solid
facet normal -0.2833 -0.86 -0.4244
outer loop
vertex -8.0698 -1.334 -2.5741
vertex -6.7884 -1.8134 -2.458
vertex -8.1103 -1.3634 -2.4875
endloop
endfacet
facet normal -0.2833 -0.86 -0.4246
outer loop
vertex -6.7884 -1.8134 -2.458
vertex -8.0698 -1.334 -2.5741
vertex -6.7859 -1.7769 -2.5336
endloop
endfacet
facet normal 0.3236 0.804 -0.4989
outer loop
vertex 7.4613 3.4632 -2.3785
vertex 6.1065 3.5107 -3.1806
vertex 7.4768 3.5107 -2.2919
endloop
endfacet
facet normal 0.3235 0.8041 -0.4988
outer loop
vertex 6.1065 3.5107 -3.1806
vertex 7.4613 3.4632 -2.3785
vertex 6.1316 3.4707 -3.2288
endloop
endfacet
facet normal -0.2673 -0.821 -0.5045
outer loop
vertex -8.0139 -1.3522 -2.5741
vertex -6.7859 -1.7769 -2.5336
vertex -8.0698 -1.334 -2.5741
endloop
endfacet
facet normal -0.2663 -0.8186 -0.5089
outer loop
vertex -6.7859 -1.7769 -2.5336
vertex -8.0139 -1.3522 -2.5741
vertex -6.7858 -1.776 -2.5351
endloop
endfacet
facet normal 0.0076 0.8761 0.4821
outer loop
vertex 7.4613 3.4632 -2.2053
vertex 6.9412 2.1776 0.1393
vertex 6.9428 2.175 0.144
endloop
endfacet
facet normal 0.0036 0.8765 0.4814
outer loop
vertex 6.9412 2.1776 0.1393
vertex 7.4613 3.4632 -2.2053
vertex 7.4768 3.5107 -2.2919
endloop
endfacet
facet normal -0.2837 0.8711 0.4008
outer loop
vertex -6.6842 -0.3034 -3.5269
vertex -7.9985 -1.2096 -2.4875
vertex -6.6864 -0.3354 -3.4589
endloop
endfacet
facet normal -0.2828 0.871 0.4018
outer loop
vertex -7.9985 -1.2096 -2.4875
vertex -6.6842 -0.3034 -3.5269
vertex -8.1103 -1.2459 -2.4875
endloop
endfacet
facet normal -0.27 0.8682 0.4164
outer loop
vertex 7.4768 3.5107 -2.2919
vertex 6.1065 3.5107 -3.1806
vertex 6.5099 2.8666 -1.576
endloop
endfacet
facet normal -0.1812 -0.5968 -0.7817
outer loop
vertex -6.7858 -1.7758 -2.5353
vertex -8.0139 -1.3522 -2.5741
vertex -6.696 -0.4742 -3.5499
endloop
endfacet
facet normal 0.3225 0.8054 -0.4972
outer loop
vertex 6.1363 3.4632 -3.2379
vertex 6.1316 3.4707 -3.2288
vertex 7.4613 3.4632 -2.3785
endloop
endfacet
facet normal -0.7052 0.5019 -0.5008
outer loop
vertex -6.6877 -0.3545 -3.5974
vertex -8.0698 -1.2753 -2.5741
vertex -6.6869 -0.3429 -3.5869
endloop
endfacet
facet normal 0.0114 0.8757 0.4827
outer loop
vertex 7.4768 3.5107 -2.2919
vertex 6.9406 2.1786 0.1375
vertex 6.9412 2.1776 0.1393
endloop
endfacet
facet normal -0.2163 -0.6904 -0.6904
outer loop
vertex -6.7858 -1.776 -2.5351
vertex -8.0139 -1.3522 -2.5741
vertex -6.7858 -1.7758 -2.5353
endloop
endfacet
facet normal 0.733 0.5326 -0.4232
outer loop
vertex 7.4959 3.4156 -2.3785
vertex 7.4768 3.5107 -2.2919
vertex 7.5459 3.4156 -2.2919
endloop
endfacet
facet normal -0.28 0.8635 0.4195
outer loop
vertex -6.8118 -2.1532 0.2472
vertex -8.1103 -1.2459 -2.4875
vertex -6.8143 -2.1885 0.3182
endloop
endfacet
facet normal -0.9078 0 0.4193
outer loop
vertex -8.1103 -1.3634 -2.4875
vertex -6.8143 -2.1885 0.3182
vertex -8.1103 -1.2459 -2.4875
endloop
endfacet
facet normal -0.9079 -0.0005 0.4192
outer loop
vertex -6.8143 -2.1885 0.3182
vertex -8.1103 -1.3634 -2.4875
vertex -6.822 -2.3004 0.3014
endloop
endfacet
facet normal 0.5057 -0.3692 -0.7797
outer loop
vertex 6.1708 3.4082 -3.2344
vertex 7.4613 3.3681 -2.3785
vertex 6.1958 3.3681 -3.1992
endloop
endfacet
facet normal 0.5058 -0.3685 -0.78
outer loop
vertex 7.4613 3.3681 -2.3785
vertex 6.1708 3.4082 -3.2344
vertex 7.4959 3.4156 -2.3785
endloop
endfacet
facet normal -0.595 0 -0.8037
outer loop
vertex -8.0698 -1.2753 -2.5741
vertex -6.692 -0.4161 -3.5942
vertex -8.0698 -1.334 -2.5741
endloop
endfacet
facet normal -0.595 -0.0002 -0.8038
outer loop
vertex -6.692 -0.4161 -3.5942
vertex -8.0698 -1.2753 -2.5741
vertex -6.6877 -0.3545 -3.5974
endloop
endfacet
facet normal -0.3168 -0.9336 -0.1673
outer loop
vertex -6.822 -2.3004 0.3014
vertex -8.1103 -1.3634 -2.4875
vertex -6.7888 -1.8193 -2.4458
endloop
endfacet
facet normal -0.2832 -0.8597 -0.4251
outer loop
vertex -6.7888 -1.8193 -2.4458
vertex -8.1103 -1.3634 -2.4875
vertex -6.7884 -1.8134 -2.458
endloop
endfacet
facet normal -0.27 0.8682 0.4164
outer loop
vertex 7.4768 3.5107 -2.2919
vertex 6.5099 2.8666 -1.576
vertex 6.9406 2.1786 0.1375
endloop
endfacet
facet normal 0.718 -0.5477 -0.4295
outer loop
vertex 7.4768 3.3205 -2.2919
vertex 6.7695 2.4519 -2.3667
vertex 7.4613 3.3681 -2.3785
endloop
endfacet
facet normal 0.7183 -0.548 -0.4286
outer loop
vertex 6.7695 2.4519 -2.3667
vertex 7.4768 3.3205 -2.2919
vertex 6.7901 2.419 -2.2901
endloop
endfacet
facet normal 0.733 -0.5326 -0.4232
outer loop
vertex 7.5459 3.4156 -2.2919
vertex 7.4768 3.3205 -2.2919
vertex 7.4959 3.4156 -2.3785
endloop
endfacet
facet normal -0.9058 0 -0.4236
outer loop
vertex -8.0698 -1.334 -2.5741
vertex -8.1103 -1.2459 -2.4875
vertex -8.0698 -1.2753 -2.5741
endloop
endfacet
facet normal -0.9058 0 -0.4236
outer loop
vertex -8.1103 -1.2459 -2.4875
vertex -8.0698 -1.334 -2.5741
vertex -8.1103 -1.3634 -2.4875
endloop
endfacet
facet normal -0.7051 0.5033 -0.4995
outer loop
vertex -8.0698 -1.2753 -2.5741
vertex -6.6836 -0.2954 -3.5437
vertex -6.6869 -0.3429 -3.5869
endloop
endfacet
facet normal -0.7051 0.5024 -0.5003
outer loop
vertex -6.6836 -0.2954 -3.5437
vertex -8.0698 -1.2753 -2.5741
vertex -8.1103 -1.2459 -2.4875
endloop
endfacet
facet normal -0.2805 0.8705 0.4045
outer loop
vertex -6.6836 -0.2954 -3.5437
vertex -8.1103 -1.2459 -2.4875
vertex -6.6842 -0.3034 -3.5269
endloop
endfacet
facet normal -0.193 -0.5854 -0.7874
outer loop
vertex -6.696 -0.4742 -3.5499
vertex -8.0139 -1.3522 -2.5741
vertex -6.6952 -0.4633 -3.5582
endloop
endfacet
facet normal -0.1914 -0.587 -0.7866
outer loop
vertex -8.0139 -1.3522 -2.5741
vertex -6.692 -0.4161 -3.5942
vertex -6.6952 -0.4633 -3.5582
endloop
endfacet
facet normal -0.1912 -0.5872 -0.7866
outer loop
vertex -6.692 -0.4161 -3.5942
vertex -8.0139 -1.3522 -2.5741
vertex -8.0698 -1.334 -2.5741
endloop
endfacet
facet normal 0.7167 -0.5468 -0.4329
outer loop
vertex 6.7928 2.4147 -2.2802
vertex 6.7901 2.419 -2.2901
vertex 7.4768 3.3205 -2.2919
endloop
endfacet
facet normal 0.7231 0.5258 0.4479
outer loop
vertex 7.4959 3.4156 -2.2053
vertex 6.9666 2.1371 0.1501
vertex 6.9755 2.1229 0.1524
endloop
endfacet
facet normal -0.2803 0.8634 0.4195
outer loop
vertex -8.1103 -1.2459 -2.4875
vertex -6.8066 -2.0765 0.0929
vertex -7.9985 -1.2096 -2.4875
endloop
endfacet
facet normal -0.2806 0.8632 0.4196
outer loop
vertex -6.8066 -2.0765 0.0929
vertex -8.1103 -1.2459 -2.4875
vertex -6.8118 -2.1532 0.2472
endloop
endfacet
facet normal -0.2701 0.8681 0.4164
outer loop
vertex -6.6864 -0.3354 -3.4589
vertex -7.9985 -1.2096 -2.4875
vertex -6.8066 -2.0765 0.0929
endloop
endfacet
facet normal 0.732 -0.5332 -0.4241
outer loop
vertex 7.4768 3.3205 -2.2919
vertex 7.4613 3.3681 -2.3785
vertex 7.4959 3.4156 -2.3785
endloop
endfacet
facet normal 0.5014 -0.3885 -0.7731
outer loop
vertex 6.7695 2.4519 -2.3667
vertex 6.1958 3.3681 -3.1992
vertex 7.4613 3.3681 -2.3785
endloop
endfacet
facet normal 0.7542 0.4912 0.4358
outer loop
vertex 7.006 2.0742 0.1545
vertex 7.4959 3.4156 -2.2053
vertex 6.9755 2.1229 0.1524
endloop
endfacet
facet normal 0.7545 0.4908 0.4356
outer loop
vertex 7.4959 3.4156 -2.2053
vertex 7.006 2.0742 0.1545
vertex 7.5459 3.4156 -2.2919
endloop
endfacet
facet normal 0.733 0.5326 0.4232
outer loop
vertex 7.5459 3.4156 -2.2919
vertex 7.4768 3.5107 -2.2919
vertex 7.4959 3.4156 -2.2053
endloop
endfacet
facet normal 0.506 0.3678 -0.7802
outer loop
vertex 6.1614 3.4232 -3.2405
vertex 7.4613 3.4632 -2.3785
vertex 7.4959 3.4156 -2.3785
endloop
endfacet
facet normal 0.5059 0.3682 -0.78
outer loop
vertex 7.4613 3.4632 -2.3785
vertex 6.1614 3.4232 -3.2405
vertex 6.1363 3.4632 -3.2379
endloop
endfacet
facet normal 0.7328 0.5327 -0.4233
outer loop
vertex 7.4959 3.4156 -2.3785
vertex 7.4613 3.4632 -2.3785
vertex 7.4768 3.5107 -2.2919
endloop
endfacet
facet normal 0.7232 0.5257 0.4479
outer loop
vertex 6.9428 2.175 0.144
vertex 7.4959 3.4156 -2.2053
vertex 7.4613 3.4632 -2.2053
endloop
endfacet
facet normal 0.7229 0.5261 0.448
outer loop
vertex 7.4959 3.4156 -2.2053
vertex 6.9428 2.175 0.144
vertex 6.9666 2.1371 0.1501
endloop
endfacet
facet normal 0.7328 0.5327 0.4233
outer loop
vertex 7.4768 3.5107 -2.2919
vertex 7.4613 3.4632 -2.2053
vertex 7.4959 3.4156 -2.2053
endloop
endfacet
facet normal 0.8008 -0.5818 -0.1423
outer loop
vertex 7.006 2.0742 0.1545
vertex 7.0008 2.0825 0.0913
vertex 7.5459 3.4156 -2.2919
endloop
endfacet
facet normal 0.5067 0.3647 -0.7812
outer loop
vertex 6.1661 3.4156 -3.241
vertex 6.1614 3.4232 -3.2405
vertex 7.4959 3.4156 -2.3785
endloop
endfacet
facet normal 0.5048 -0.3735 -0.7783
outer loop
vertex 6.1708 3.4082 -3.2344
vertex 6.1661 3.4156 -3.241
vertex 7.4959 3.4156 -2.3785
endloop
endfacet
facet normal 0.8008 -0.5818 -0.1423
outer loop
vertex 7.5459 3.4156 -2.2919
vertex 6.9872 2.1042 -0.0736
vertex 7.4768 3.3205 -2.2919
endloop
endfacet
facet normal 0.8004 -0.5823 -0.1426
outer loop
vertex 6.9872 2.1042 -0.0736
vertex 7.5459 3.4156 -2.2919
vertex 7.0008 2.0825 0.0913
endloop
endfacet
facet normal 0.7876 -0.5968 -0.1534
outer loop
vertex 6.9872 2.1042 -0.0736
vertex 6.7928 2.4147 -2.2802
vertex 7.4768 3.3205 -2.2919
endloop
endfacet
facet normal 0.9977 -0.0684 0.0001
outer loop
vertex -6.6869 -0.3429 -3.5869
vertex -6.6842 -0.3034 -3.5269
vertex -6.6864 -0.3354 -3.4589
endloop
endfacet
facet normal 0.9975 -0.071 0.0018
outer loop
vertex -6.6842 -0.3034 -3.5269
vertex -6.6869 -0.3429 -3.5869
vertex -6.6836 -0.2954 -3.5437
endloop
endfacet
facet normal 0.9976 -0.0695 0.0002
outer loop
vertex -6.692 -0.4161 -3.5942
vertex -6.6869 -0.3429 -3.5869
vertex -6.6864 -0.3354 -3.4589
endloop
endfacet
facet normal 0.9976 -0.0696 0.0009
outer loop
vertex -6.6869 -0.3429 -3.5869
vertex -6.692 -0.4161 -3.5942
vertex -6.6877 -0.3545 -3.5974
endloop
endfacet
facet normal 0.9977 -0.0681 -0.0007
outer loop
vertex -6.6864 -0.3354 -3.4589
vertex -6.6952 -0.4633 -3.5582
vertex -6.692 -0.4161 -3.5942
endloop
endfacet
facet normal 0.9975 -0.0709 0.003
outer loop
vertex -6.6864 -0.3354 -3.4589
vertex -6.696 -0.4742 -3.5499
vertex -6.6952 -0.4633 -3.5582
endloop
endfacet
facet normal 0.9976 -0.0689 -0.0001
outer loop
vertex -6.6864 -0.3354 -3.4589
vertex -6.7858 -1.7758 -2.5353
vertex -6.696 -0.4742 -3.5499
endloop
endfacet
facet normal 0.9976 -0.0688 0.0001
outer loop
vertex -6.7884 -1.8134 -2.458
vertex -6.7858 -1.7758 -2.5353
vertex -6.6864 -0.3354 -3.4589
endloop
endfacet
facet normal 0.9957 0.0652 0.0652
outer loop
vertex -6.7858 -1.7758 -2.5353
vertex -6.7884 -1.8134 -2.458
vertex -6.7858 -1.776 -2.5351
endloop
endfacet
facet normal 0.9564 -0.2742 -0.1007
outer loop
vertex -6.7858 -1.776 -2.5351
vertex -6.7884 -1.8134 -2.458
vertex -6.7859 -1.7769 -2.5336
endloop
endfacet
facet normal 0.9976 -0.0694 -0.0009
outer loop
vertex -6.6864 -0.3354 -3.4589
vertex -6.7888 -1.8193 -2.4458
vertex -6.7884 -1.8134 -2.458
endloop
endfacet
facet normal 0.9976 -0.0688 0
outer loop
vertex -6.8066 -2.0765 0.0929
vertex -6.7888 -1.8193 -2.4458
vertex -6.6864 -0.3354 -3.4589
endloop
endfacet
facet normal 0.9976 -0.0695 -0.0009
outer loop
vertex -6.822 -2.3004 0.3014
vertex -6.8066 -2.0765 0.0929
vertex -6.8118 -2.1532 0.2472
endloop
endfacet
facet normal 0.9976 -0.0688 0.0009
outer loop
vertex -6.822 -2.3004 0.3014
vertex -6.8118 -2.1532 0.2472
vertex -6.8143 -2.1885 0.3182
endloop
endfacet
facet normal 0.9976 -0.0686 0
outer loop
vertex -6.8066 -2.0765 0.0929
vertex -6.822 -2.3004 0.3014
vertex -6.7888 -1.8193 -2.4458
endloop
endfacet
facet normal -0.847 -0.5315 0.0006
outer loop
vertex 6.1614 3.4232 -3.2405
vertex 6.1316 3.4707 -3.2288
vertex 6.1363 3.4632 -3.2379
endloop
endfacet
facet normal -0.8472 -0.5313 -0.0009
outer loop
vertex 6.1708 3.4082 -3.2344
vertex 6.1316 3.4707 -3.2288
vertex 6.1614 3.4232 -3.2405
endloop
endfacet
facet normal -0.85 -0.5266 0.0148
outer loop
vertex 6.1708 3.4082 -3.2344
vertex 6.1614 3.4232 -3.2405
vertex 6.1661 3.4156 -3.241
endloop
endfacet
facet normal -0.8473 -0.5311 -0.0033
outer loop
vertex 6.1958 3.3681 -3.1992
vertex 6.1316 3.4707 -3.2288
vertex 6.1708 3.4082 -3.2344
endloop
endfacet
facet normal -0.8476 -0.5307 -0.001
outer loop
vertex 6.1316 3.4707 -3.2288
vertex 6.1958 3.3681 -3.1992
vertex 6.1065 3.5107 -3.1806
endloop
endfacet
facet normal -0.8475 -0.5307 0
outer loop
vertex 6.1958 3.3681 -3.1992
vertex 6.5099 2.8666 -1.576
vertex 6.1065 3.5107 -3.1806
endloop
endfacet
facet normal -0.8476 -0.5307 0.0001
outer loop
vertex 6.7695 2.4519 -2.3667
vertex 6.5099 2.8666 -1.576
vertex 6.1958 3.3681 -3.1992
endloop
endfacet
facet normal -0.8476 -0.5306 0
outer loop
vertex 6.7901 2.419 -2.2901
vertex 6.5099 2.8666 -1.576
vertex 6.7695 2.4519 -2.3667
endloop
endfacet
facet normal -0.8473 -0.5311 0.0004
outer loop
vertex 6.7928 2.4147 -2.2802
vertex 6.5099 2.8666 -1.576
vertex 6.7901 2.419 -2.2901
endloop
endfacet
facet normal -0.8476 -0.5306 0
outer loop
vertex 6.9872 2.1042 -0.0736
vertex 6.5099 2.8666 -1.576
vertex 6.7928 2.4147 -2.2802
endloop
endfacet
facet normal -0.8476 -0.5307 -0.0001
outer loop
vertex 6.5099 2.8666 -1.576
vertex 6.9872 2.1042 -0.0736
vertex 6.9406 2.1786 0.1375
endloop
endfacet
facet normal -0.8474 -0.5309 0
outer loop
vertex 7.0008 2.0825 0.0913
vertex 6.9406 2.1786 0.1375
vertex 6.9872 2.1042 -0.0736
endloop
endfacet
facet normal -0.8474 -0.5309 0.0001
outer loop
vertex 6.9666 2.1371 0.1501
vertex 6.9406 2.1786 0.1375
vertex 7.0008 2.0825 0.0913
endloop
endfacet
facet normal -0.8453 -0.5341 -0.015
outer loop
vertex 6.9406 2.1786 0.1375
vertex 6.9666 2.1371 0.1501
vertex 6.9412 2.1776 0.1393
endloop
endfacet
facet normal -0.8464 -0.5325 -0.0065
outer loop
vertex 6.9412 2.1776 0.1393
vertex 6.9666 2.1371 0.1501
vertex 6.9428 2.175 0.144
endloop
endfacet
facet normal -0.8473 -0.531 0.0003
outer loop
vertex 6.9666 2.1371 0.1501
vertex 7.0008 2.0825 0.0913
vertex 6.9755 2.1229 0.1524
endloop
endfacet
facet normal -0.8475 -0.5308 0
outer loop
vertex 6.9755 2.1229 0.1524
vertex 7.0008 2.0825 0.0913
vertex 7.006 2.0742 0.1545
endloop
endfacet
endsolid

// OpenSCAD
// Auto-generated OpenSCAD file

    inner_points = 10*[[0.23620735966763612, -0.8589852711237532, 6.281120552158003e-15], [0.3476109579235432, 0.7552090254358436, 7.186745320395964e-14], [-0.6913160481523587, -0.48522020059684634, -1.2256510252105723e-13], [-0.6224648379611696, 0.5124067391232119, -8.203051974478681e-14], [0.8782995612527119, -0.092357848796825, 1.2644704850972638e-13], [0.0296673985459932, -0.03378951119168972, 0.5257311121191336]];

    outer_points = 10*[[0.5545913541974953, -0.130465753147186, 0.6316754822336427], [-0.8029377257364648, -0.130465753147186, -0.24874986149718784], [0.7445891768936461, 0.3415637761071865, -0.22918975163436395], [-0.09440993522191399, 0.3415637761071865, -0.7733225386168263], [-0.4018328701327624, -0.422196045920001, 0.6195866695147354], [0.14198138773148855, -0.4564076590866669, -0.2189213021039538]];

    // Convex hull for inner set (I)
    module inner_hull() {
        hull() {
            for (p = inner_points) {
                translate(p) sphere(r=0.1);
            }
        }
    }

    // Convex hull for outer set (O) minus inner hull (O \ I)
    module outer_minus_inner() {
        difference() {
            hull() {
                for (p = outer_points) {
                    translate(p) sphere(r=0.1);
                }
            }
            inner_hull(); // Subtract inner hull
        }
    }

    // Convex hull for outer set (O) minus all translated inner hulls
    module outer_minus_AllTranslationInner() {
        difference() {
            hull() {
                for (p = outer_points) {
                    translate(p) sphere(r=0.1);
                }
            }
            hull() {
                translate([0,0,50]) inner_hull();
                translate([0,0,-50]) inner_hull();
            }; // Subtract translated inner hulls
        }
    }

    // Difference between outer_minus_inner and outer_minus_AllTranslationInner
    module outer_minus_inner_diff() {
        difference() {
            // Outer minus inner
            difference() {
                hull() {
                    for (p = outer_points) {
                        translate(p) sphere(r=0.1);
                    }
                }
                inner_hull();
            }

            // Subtract Outer minus AllTranslationInner
            difference() {
                hull() {
                    for (p = outer_points) {
                        translate(p) sphere(r=0.1);
                    }
                }
                hull() {
                    translate([0,0,50]) inner_hull();
                    translate([0,0,-50]) inner_hull();
                };
            }
        }
    }

    // Rendering all with colors applied
    color([0, 1, 0, 1]) outer_minus_AllTranslationInner(); // Opaque green
    
